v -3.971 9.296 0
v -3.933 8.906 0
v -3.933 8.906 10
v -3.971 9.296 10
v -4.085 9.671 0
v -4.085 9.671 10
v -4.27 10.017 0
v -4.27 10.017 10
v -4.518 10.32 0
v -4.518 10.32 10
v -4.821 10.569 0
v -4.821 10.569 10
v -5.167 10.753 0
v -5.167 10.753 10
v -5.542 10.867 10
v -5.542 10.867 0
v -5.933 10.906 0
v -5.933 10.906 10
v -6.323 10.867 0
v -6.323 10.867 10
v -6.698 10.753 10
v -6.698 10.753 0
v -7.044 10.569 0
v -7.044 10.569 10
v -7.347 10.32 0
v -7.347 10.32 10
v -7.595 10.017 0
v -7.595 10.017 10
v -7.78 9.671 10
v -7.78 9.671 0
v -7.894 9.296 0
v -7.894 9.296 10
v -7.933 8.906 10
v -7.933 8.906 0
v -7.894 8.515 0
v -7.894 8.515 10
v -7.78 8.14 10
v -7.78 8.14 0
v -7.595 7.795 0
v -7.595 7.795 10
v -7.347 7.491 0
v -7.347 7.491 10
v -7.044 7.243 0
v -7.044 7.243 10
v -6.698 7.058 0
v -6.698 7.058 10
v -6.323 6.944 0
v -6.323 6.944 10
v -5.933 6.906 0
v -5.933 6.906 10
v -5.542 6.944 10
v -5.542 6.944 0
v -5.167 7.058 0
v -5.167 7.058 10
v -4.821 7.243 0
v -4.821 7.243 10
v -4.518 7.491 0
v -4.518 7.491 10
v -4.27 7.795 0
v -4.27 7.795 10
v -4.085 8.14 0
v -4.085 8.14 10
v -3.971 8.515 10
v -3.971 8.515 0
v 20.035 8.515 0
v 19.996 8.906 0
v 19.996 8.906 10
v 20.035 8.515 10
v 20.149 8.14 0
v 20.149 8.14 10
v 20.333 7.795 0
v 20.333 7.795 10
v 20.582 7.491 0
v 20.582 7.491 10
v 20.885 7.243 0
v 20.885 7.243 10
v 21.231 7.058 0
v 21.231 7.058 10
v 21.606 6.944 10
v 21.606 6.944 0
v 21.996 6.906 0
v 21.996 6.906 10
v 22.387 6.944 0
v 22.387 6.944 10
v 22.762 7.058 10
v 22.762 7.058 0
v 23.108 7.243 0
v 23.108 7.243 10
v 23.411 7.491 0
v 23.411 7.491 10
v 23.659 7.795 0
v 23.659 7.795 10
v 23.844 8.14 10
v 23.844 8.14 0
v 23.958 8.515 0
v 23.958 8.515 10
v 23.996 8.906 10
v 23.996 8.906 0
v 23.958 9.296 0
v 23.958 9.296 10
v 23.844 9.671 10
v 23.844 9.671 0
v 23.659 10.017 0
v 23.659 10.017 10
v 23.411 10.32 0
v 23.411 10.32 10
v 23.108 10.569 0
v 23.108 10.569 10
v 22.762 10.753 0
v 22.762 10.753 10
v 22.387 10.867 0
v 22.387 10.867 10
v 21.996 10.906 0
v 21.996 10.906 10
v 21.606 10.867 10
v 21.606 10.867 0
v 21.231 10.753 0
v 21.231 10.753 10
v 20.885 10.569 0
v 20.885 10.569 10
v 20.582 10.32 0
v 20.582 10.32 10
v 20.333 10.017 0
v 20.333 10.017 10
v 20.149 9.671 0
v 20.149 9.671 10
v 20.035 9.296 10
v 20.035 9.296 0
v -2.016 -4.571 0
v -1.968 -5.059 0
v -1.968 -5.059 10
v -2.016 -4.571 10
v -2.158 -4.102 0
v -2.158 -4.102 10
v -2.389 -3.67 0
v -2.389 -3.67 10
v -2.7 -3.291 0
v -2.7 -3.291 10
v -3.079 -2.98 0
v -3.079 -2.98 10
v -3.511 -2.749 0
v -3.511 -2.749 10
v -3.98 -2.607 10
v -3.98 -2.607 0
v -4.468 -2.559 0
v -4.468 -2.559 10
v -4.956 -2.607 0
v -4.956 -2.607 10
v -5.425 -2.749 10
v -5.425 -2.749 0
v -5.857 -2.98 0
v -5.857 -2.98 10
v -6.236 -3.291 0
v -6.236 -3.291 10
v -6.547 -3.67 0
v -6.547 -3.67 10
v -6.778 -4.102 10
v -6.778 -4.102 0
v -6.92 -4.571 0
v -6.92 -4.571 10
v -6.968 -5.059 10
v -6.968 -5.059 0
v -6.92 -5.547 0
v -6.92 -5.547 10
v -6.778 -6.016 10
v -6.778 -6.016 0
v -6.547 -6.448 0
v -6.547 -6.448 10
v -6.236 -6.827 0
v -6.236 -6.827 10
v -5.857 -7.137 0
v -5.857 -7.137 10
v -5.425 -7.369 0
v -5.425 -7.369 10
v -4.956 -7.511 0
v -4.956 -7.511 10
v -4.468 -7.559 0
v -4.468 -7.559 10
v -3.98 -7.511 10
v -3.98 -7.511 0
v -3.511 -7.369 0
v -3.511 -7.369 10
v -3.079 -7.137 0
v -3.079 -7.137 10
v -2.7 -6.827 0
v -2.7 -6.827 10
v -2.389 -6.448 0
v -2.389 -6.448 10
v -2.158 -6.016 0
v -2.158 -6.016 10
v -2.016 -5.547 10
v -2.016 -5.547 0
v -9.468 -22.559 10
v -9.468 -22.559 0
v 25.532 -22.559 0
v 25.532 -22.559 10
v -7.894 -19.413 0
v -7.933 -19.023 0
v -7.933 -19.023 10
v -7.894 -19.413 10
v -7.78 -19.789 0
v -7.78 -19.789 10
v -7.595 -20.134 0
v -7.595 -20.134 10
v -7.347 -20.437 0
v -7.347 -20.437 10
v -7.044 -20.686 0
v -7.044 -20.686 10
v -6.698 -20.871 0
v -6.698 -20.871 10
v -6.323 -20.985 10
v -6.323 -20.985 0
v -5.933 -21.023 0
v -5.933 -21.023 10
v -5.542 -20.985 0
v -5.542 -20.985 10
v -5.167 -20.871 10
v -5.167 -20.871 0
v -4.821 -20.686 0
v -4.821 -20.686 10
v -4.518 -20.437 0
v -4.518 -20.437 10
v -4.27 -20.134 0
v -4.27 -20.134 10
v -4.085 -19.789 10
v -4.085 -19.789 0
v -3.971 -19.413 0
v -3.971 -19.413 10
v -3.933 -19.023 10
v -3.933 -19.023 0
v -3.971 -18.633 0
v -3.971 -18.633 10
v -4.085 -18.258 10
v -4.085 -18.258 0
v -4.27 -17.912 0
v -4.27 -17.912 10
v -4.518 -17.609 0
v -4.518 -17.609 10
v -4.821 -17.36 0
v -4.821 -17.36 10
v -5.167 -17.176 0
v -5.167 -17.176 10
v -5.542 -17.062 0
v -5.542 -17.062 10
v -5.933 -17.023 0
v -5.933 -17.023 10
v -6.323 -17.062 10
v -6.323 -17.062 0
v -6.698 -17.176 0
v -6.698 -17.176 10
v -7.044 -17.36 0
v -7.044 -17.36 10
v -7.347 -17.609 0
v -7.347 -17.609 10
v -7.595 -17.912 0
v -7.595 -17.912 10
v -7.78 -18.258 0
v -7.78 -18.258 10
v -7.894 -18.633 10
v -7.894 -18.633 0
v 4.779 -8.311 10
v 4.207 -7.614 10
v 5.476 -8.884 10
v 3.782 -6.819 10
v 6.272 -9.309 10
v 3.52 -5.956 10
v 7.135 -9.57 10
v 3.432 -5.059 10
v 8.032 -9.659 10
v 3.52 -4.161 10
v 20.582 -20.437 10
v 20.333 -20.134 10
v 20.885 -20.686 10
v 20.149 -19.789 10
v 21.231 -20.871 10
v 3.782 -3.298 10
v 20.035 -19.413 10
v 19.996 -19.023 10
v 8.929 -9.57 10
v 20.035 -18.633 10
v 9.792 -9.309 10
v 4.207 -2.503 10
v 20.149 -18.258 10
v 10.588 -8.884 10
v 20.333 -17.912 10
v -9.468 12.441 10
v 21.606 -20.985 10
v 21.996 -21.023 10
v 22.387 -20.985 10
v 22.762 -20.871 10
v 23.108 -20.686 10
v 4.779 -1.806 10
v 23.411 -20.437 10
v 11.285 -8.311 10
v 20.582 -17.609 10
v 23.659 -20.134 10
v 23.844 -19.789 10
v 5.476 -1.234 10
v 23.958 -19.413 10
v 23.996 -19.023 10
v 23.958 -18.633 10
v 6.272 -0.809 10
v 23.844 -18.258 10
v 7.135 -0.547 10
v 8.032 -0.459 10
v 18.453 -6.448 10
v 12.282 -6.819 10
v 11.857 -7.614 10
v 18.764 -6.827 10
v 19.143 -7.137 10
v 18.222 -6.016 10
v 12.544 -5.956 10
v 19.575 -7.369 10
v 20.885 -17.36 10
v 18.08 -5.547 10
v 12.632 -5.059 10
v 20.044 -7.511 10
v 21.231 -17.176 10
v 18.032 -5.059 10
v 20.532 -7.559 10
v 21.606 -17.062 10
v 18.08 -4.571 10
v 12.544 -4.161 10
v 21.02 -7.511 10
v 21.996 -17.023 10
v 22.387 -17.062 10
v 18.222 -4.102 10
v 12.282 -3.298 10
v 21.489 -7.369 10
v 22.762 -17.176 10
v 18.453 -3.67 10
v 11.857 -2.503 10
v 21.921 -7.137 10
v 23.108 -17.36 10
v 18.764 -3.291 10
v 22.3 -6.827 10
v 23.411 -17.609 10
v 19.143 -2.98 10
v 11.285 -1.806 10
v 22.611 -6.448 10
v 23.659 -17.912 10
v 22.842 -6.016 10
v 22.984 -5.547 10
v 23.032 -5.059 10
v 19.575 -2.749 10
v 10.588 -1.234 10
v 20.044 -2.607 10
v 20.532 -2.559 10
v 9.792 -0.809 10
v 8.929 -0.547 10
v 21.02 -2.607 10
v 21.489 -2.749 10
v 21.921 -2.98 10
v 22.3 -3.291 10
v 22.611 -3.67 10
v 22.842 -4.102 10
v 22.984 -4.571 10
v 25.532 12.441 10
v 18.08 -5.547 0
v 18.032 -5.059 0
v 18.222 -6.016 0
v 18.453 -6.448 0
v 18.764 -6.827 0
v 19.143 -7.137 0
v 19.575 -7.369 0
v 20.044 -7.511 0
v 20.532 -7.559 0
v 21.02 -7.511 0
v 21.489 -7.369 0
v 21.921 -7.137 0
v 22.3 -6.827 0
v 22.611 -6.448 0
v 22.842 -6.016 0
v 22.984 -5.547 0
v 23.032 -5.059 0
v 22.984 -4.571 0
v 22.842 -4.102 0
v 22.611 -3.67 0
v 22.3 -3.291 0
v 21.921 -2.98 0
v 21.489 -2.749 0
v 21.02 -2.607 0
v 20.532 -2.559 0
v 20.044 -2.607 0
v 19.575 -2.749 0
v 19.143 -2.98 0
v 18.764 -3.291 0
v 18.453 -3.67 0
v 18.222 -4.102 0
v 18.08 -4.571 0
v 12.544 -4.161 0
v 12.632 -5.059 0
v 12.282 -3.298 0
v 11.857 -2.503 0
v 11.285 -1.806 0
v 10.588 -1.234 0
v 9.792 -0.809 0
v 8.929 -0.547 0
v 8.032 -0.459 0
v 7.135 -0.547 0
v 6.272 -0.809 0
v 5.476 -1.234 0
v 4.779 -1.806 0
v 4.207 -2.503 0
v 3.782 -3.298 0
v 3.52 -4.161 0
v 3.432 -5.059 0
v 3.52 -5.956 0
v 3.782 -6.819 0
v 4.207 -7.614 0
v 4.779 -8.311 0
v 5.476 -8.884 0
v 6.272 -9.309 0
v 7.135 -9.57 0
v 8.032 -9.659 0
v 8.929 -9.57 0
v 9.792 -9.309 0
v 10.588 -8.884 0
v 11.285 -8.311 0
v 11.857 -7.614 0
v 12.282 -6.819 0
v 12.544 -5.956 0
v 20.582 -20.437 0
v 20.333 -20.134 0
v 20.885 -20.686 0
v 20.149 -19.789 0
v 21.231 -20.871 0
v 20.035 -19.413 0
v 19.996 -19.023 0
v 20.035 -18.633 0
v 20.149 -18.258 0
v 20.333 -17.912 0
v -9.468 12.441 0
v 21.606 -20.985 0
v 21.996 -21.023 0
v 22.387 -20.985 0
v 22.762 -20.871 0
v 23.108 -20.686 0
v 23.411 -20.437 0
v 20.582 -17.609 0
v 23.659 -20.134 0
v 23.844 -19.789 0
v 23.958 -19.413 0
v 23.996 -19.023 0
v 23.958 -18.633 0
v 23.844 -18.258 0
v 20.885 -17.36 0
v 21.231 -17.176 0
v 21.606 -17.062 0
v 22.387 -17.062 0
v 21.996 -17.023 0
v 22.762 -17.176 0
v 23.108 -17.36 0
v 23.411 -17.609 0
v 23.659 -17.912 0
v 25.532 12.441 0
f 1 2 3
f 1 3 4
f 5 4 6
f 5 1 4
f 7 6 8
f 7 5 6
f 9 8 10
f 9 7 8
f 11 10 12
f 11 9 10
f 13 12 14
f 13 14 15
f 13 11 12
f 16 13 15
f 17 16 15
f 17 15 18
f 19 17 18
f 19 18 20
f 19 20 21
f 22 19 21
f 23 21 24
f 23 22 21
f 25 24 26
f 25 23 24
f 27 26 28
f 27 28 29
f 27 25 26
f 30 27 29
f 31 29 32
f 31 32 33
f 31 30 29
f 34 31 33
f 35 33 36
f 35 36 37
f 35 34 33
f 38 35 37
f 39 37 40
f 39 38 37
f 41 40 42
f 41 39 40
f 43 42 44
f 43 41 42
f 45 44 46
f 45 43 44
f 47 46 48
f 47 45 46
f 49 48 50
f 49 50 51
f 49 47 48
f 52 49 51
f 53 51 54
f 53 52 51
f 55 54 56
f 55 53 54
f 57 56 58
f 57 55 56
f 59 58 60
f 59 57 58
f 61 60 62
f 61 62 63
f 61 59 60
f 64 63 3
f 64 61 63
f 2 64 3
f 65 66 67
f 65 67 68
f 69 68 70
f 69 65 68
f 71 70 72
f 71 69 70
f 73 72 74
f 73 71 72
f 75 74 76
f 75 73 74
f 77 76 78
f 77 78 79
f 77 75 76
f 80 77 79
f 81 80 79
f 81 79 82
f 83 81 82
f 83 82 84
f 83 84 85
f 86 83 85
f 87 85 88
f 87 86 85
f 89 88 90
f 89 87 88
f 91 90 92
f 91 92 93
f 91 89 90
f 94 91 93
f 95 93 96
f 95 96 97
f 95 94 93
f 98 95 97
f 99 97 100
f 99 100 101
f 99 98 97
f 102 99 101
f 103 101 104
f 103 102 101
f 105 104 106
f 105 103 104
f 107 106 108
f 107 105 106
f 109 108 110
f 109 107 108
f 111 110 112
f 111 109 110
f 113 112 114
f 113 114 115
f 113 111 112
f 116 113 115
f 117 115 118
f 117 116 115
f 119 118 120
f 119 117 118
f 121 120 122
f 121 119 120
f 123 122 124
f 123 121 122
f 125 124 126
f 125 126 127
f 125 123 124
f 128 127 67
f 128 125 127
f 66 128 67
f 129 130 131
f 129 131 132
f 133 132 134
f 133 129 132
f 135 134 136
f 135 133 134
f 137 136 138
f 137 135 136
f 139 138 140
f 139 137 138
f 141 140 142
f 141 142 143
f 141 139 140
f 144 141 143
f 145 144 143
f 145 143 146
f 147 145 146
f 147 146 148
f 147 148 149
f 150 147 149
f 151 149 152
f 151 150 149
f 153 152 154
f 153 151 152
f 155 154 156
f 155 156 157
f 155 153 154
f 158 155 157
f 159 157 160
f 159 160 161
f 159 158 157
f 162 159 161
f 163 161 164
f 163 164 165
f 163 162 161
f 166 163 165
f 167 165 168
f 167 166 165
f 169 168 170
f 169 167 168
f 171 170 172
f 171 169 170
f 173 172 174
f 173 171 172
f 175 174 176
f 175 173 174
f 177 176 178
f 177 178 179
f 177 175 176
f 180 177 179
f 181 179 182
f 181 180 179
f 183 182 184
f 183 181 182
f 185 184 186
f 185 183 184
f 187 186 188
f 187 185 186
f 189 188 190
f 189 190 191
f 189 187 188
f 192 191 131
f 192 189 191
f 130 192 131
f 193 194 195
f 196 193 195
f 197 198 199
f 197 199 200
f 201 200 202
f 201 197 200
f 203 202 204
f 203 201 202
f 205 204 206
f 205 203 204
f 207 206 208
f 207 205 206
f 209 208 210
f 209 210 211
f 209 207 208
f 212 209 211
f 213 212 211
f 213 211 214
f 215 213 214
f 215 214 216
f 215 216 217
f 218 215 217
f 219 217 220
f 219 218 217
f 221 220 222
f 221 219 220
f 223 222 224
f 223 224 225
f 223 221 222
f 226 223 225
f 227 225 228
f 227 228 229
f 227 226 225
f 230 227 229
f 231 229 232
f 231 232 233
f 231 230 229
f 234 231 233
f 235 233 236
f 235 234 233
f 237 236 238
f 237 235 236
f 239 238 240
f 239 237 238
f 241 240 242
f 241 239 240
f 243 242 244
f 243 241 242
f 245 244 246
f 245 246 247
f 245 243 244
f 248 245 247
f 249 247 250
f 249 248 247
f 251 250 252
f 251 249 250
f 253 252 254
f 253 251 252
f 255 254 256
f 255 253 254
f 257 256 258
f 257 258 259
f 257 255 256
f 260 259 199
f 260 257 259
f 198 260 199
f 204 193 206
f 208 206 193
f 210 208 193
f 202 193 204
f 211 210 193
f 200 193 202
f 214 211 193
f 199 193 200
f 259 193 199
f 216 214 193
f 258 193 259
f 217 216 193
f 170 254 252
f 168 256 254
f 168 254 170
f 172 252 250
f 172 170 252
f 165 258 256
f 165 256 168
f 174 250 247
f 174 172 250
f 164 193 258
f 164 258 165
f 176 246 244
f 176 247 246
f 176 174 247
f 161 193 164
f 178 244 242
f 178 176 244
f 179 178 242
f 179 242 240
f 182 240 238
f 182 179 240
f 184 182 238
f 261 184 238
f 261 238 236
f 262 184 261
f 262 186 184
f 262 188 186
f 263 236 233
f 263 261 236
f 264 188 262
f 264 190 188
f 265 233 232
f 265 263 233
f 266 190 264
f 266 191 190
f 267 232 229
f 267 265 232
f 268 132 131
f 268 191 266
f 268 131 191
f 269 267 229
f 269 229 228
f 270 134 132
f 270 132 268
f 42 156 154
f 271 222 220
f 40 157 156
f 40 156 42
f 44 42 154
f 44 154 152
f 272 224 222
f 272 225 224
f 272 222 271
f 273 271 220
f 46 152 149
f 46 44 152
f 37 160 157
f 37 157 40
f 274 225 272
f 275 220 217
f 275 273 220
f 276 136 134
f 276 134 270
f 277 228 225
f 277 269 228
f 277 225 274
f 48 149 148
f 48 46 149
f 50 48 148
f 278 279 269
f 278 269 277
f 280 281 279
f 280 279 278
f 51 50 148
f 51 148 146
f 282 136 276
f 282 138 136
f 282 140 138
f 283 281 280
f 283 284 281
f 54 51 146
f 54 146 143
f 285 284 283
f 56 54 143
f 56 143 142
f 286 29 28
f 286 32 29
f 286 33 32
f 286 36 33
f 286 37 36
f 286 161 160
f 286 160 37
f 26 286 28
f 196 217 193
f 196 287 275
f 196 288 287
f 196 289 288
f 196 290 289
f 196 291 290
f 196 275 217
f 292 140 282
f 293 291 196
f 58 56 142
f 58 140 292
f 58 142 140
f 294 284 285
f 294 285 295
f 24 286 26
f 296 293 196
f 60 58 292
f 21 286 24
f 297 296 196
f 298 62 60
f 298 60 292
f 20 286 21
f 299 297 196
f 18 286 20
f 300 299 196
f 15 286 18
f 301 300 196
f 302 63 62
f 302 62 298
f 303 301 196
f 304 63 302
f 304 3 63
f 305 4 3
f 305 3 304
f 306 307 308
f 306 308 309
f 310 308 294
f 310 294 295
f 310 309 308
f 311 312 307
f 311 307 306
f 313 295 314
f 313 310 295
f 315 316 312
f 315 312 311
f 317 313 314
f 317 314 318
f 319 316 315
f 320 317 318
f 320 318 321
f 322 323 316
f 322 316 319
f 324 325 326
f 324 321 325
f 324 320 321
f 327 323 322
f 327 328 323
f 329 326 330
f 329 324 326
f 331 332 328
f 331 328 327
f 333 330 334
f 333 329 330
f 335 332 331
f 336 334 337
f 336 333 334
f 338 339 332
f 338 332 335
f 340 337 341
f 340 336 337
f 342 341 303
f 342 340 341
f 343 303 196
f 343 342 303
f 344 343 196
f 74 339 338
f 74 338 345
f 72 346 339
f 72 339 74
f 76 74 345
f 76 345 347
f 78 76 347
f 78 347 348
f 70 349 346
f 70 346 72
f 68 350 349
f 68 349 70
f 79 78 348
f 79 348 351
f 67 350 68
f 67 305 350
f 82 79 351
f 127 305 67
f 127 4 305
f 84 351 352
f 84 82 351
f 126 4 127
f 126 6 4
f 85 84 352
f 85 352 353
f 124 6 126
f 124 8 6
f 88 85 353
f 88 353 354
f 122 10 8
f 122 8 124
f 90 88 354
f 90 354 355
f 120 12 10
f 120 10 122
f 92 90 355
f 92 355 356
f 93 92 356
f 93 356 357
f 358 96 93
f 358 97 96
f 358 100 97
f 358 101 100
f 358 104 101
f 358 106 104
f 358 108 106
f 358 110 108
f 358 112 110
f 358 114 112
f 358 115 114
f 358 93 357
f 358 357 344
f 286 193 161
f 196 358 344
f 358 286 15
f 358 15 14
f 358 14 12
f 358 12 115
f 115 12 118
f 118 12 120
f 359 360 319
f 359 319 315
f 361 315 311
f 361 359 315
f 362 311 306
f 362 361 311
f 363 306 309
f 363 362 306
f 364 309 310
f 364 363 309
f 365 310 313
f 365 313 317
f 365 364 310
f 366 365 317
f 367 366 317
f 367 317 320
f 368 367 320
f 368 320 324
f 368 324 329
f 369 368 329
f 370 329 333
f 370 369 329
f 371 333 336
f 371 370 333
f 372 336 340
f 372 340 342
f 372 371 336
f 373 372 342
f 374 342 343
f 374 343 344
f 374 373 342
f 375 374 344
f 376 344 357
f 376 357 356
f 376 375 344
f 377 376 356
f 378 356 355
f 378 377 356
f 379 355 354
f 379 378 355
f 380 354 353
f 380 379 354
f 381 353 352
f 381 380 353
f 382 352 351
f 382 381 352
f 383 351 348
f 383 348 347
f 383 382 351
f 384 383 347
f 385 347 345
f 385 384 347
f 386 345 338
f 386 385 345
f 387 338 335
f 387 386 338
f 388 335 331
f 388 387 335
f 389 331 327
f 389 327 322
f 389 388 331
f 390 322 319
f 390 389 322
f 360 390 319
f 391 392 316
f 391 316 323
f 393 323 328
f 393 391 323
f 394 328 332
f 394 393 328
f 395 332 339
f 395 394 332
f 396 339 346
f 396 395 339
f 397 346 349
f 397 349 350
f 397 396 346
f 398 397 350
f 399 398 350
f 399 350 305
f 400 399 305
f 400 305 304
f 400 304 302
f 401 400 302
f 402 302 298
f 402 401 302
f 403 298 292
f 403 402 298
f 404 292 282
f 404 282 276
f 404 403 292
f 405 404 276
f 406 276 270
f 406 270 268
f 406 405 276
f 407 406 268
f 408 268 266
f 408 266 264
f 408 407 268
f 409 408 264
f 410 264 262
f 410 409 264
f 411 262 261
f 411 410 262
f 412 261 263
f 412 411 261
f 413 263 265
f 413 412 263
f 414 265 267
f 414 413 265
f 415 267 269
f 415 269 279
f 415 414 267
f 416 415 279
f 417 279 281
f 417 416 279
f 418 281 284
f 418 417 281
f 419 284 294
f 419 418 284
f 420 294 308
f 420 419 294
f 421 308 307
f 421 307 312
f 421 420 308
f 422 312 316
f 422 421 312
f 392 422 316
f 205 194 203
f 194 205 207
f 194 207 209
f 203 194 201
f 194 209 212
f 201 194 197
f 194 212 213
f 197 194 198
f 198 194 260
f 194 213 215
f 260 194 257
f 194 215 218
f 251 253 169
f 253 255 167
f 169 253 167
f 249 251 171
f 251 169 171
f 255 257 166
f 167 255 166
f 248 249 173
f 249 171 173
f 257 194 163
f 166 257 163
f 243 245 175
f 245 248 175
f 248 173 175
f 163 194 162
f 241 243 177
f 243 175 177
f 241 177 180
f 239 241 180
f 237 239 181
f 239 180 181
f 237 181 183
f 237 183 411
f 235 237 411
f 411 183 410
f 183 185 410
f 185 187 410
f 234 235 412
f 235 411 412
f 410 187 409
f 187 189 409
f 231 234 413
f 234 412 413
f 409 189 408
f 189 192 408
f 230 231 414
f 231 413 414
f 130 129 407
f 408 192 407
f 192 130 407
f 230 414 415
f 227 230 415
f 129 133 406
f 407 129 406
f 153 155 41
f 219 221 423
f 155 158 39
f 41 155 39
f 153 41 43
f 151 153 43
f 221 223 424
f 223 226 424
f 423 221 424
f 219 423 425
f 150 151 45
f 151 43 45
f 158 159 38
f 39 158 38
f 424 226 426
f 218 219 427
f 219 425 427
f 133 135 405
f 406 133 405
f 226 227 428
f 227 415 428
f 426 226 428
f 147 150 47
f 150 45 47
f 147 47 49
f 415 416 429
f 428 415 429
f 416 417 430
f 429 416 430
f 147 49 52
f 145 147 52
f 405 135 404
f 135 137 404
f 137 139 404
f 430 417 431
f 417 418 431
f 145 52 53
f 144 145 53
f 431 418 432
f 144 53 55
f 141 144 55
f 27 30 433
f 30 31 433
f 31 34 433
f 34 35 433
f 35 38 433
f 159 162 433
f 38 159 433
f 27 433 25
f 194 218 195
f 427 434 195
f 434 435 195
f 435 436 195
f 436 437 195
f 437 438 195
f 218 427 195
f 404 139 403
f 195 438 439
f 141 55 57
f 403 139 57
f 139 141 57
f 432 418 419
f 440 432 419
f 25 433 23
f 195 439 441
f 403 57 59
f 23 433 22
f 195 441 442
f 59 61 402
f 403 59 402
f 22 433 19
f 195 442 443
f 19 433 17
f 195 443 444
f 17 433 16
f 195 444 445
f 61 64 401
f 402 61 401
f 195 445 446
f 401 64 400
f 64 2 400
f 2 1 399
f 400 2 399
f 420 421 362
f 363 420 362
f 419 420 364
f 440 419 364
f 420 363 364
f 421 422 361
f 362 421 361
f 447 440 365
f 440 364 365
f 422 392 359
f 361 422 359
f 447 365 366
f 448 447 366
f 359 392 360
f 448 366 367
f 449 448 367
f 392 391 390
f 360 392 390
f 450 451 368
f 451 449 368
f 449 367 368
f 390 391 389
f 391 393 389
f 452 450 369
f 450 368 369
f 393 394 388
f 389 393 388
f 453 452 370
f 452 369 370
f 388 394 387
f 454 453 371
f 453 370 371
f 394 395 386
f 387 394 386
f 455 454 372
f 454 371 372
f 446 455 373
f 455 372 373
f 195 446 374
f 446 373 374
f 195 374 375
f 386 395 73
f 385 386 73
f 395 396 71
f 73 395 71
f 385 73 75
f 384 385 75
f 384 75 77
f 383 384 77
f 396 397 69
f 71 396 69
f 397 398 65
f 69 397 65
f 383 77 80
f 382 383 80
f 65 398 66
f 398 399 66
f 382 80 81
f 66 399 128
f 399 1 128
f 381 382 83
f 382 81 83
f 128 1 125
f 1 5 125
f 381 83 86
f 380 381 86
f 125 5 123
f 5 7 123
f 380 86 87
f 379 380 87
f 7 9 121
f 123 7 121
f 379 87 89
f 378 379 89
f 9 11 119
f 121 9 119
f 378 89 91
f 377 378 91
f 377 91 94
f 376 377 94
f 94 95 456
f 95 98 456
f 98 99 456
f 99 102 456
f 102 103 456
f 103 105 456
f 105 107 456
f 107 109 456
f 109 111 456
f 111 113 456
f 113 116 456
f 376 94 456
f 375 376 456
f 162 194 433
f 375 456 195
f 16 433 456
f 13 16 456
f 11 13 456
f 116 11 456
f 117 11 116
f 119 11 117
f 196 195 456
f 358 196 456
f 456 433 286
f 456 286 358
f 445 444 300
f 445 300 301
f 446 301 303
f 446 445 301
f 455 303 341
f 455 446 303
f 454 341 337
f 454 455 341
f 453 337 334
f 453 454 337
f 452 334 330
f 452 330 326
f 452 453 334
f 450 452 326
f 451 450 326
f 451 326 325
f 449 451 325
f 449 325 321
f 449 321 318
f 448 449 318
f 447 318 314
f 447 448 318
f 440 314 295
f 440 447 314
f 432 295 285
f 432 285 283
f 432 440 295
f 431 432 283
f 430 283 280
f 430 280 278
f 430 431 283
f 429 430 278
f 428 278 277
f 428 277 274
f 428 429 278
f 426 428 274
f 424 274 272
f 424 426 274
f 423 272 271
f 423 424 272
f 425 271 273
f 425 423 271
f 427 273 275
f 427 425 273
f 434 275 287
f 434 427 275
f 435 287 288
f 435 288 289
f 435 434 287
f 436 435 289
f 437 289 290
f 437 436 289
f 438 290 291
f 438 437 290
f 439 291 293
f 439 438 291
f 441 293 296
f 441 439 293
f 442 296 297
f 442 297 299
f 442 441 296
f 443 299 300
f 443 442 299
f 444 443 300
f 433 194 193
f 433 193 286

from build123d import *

# Parameters (mm, degrees)
SKETCH1_W           = 35
SKETCH1_H           = 35
SKETCH1_R           = 4.6
SKETCH1_R_2         = 2
SKETCH1_R_3         = 2.5
BOSS_EXTRUDE1_DEPTH = 10


with BuildPart() as part:
    # Sketch1 → Boss-Extrude1 (new body)
    with BuildSketch(Plane.XY):
        with Locations((8.031937938, -5.058807352)):
            Rectangle(SKETCH1_W, SKETCH1_H)
        with Locations((8.031937938, -5.058807352)):
            Circle(SKETCH1_R, mode=Mode.SUBTRACT)
        with Locations((21.996404032, -19.023273446)):
            Circle(SKETCH1_R_2, mode=Mode.SUBTRACT)
        with Locations(Location((21.996404032, 8.905658742, 0), (0, 0, 180))):
            Circle(SKETCH1_R_2, mode=Mode.SUBTRACT)
        with Locations(Location((-5.932528156, -19.023273446, 0), (0, 0, 180))):
            Circle(SKETCH1_R_2, mode=Mode.SUBTRACT)
        with Locations((-5.932528156, 8.905658742)):
            Circle(SKETCH1_R_2, mode=Mode.SUBTRACT)
        with Locations((-4.468062062, -5.058807352)):
            Circle(SKETCH1_R_3, mode=Mode.SUBTRACT)
        with Locations(Location((20.531937938, -5.058807352, 0), (0, 0, 180))):
            Circle(SKETCH1_R_3, mode=Mode.SUBTRACT)
    extrude(amount=BOSS_EXTRUDE1_DEPTH)


solid = part.part
